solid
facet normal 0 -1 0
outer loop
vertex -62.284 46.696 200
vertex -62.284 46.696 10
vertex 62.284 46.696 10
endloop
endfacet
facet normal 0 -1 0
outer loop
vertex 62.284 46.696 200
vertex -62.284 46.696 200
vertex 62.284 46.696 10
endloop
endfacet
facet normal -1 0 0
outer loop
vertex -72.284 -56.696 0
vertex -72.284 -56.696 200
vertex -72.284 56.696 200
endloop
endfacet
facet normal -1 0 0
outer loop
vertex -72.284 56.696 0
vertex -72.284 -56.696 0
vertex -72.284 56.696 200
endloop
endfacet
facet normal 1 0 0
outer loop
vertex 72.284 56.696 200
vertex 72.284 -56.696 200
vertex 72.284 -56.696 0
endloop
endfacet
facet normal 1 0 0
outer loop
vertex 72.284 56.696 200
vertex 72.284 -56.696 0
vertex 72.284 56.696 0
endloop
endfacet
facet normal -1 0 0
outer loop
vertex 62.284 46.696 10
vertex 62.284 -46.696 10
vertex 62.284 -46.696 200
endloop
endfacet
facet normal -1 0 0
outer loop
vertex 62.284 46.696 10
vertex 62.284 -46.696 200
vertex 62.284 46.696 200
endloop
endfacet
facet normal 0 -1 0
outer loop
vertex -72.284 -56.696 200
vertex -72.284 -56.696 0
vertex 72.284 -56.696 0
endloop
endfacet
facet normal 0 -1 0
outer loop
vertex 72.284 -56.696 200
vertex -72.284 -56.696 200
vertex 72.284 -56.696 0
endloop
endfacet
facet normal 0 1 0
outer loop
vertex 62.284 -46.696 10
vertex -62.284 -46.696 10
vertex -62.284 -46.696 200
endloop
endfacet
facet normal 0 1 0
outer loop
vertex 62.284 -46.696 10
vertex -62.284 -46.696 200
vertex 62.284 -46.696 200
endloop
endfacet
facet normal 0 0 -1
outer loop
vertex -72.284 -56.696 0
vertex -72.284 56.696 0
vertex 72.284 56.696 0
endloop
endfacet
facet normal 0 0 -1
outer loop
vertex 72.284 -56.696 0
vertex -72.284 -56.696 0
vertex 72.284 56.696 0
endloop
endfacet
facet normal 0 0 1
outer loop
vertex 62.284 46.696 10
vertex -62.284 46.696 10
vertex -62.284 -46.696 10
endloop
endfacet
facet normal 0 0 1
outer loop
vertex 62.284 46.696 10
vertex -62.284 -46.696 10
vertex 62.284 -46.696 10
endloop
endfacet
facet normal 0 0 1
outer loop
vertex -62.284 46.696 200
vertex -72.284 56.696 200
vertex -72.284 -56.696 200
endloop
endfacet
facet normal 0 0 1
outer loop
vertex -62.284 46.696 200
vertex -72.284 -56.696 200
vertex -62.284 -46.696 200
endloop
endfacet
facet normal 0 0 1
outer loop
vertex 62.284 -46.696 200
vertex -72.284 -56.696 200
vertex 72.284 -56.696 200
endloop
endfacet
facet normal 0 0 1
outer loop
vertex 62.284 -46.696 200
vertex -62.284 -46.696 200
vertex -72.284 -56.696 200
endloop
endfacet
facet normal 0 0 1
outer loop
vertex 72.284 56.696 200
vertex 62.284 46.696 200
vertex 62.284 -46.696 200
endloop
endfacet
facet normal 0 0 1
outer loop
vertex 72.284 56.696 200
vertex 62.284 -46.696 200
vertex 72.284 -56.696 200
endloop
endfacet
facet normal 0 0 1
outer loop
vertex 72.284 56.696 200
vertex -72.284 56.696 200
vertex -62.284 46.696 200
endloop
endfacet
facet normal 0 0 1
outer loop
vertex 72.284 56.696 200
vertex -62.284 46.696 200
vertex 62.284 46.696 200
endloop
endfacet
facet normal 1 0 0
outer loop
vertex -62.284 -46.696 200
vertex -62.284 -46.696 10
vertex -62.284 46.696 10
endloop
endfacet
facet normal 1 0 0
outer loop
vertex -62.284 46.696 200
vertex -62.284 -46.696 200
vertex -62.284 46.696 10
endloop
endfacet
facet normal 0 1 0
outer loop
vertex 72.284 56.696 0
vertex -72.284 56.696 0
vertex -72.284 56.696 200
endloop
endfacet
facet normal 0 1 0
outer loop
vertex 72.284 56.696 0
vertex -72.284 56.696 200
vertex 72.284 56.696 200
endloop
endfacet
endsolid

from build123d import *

# Parameters (mm, degrees)
CROQUIS1_W              = 144.567109546
CROQUIS1_H              = 113.391382114
SALIENTE_EXTRUIR1_DEPTH = 200
VACIADO2_T              = -10


with BuildPart() as part:
    # Croquis1 → Saliente-Extruir1 (new body)
    with BuildSketch(Plane.XY):
        Rectangle(CROQUIS1_W, CROQUIS1_H)
    extrude(amount=SALIENTE_EXTRUIR1_DEPTH)

    # Vaciado2
    vaciado2_openings = [part.faces().sort_by_distance(p)[0] for p in [
        (0, 0, 200),
    ]]
    offset(amount=VACIADO2_T, openings=vaciado2_openings, kind=Kind.INTERSECTION)


solid = part.part
